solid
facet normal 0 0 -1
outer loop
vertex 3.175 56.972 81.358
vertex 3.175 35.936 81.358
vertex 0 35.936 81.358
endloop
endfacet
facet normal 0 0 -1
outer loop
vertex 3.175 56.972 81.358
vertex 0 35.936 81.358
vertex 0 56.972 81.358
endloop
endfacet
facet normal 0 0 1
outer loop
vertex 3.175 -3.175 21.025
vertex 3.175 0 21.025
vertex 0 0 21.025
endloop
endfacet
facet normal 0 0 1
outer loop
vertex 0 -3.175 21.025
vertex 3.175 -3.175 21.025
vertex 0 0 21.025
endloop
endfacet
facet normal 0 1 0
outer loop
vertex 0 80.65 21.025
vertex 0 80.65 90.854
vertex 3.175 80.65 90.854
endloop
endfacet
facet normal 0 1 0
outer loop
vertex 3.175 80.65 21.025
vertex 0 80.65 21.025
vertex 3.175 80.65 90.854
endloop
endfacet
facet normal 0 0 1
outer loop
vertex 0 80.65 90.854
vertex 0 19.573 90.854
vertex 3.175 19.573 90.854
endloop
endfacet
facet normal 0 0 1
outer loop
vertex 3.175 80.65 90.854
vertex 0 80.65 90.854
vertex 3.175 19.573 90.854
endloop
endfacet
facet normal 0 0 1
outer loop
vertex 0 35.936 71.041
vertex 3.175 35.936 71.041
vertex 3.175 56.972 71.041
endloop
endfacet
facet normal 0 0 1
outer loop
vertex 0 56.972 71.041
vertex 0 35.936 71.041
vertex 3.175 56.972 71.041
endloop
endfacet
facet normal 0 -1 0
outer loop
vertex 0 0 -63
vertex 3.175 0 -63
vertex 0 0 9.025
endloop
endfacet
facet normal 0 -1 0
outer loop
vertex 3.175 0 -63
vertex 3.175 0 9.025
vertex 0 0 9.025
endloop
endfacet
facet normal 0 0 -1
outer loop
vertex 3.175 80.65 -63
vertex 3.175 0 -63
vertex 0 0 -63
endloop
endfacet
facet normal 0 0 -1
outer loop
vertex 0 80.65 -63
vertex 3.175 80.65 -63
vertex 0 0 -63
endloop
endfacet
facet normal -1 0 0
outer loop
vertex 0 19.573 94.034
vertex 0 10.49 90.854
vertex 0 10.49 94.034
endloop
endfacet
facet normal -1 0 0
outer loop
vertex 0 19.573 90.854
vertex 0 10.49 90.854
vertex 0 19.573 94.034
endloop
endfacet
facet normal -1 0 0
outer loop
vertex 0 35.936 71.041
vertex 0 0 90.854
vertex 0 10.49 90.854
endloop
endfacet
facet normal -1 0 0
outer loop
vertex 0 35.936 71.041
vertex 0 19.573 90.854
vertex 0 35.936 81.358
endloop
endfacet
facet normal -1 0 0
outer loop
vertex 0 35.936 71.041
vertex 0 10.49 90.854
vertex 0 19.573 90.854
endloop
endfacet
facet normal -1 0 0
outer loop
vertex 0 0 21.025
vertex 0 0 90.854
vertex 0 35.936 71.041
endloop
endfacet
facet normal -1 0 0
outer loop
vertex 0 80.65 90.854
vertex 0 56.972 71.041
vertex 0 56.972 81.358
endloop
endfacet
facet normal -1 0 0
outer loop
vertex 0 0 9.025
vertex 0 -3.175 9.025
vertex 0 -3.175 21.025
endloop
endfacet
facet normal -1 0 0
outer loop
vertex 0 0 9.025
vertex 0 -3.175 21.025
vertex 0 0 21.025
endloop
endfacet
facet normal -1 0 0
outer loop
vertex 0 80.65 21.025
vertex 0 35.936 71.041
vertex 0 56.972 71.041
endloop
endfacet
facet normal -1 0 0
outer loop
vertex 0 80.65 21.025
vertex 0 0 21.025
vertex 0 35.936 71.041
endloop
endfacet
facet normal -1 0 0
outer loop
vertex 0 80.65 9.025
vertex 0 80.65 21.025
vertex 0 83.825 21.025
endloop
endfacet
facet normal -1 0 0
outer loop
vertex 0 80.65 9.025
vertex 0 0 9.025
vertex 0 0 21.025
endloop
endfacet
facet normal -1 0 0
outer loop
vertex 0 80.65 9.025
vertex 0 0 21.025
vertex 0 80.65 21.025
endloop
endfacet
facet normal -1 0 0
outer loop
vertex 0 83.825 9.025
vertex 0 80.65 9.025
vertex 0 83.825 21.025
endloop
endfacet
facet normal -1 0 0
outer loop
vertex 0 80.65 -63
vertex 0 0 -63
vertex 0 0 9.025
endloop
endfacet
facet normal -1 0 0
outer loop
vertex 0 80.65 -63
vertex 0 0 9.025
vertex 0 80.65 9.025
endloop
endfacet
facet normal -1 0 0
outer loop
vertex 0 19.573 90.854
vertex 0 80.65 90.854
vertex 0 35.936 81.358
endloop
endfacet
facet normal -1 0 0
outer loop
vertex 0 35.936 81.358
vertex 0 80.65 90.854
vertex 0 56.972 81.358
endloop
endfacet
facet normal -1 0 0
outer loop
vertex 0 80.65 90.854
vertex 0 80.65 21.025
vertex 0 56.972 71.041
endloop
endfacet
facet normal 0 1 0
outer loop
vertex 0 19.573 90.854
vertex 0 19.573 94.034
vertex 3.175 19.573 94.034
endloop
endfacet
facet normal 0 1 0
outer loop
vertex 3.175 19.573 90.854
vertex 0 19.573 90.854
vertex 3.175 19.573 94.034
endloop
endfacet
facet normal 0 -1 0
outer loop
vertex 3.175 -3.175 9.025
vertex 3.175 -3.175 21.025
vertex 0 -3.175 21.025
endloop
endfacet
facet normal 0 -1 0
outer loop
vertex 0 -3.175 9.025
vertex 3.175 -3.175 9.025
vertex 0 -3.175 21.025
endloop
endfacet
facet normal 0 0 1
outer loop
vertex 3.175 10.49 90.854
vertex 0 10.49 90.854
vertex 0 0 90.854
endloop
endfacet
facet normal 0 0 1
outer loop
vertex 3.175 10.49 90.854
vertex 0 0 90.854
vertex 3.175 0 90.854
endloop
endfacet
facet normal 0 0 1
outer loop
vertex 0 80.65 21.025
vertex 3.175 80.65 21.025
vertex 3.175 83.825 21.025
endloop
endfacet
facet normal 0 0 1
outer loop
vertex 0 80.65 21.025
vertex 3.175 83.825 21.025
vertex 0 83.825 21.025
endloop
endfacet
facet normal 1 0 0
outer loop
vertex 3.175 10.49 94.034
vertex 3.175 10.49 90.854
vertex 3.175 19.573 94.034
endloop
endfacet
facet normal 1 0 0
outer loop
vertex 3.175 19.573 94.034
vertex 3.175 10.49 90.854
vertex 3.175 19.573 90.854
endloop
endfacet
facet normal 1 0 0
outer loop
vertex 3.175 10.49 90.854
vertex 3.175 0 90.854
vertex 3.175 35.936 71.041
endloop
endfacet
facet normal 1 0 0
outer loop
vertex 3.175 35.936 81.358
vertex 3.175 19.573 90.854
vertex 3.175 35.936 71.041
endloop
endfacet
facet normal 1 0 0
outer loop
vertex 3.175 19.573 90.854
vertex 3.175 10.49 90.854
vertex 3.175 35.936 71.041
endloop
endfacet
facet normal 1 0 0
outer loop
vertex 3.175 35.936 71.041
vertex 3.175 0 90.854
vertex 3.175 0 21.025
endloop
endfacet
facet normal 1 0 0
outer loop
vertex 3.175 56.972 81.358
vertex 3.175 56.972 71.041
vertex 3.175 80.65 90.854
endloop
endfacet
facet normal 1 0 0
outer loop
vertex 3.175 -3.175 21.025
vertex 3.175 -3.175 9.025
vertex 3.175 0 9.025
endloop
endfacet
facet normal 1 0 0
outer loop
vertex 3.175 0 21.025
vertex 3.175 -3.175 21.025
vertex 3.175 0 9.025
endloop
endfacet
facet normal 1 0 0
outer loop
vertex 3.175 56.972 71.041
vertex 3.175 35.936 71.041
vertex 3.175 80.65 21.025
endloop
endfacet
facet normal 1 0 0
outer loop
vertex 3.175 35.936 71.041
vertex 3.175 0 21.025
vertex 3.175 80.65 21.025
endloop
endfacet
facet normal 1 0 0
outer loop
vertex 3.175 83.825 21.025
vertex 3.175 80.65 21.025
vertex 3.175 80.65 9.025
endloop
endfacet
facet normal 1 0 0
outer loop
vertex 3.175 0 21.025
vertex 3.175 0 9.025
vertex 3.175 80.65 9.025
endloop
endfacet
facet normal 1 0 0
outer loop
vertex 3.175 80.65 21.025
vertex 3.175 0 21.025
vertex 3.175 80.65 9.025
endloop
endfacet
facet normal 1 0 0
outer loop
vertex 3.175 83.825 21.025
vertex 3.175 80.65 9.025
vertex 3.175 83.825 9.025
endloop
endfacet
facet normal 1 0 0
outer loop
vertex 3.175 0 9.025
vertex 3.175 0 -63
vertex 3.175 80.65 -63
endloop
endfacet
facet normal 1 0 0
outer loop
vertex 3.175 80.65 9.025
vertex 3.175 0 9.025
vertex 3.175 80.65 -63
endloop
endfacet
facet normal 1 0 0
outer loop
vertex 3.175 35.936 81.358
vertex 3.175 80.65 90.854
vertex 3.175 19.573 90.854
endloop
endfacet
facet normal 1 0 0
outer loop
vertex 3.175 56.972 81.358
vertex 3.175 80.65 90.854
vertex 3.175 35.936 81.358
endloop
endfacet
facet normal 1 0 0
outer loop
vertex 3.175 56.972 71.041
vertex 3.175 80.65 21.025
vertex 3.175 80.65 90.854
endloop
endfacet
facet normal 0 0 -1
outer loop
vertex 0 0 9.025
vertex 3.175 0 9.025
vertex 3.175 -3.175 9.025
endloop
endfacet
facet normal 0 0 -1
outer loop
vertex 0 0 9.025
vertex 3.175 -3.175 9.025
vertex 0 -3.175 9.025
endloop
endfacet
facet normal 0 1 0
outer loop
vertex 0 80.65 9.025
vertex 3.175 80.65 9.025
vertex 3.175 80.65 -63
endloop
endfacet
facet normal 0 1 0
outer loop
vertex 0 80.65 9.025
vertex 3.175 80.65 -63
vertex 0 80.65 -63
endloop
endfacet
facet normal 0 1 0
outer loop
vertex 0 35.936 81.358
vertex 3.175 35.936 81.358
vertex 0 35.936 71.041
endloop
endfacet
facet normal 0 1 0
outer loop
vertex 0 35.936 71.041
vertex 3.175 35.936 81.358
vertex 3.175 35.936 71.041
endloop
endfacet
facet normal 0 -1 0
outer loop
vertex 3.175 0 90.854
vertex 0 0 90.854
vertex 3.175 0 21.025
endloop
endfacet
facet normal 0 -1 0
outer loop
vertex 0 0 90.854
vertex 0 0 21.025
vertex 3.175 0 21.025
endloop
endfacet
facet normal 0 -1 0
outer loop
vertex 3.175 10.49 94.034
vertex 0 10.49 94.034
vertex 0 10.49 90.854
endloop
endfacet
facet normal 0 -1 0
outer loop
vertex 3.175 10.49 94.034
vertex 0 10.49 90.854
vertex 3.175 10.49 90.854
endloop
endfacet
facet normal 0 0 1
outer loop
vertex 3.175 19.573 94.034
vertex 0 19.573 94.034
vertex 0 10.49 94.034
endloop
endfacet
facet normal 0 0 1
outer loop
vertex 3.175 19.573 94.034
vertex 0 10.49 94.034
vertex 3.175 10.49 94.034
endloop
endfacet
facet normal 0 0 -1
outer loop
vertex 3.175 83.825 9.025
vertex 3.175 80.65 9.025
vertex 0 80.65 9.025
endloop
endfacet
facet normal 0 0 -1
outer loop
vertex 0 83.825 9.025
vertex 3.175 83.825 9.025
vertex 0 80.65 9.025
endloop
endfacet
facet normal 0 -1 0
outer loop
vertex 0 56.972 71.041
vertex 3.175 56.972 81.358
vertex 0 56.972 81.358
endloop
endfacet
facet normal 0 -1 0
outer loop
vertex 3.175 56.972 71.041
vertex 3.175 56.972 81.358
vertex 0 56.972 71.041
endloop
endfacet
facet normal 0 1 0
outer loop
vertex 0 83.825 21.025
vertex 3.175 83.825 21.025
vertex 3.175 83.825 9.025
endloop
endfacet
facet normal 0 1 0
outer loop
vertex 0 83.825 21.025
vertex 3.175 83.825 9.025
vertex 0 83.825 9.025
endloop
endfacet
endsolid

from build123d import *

# Parameters (mm, degrees)
SKETCH1_W           = 38.1
SKETCH1_H           = 40.325
BOSS_EXTRUDE1_DEPTH = 3.175
SKETCH3_W           = 3.175
SKETCH3_H           = 10.49
SKETCH3_H_2         = 20.695
CUT_EXTRUDE2_DEPTH  = 4.175
SKETCH5_W           = 3.175
SKETCH5_H           = 12
BOSS_EXTRUDE2_DEPTH = 3.175
SKETCH7_W           = 3.175
SKETCH7_H           = 80.65
BOSS_EXTRUDE3_DEPTH = 63
SKETCH8_W           = 3.175
SKETCH8_H           = 80.65
BOSS_EXTRUDE4_DEPTH = 55.929385
SKETCH9_W           = 3.175
SKETCH9_H           = 9.082720128
BOSS_EXTRUDE5_DEPTH = 3.18
SKETCH10_W          = 10.316938
SKETCH10_H          = 21.036408148
CUT_EXTRUDE3_DEPTH  = 3.18


with BuildPart() as part:
    # Sketch1 → Boss-Extrude1 (new body)
    with BuildSketch(Plane(origin=(0, 0, 0), x_dir=(0, 0, -1), z_dir=(1, 0, 0))):
        with Locations((-19.05, 20.1625)):
            Rectangle(SKETCH1_W, SKETCH1_H)
    boss_extrude1 = extrude(amount=BOSS_EXTRUDE1_DEPTH)

    # Sketch3 → Cut-Extrude2 (cut, through all)
    with BuildSketch(Plane(origin=(3.175, 0, 0), x_dir=(0, 0, -1), z_dir=(1, 0, 0))):
        with Locations((-36.5125, 35.08)):
            Rectangle(SKETCH3_W, SKETCH3_H)
        with Locations((-36.5125, 10.3475)):
            Rectangle(SKETCH3_W, SKETCH3_H_2)
    cut_extrude2 = extrude(amount=-CUT_EXTRUDE2_DEPTH, mode=Mode.SUBTRACT)

    # Sketch5 → Boss-Extrude2 (add)
    with BuildSketch(Plane(origin=(0, 0, 0), x_dir=(-1, 0, 0), z_dir=(0, -1, 0))):
        with Locations((-1.5875, -15.025)):
            Rectangle(SKETCH5_W, SKETCH5_H)
    boss_extrude2 = extrude(amount=BOSS_EXTRUDE2_DEPTH)

    # Mirror1: Boss-Extrude1, Cut-Extrude2, Boss-Extrude2 across plane
    add(boss_extrude1.mirror(Plane(origin=(3.175, 40.325, 0), x_dir=(0, 0, 1), z_dir=(0, -1, 0))))
    add(cut_extrude2.mirror(Plane(origin=(3.175, 40.325, 0), x_dir=(0, 0, 1), z_dir=(0, -1, 0))), mode=Mode.SUBTRACT)
    add(boss_extrude2.mirror(Plane(origin=(3.175, 40.325, 0), x_dir=(0, 0, 1), z_dir=(0, -1, 0))))

    # Sketch7 → Boss-Extrude3 (add)
    with BuildSketch(Plane(origin=(0, 0, 0), x_dir=(-1, 0, 0), z_dir=(0, 0, -1))):
        with Locations((-1.5875, 40.325)):
            Rectangle(SKETCH7_W, SKETCH7_H)
    extrude(amount=BOSS_EXTRUDE3_DEPTH)

    # Sketch8 → Boss-Extrude4 (add)
    with BuildSketch(Plane.XY.offset(34.925)):
        with Locations((1.5875, 40.325)):
            Rectangle(SKETCH8_W, SKETCH8_H)
    extrude(amount=BOSS_EXTRUDE4_DEPTH)

    # Sketch9 → Boss-Extrude5 (add)
    with BuildSketch(Plane.XY.offset(90.85438473)):
        with Locations((1.5875, 15.031360064)):
            Rectangle(SKETCH9_W, SKETCH9_H)
    extrude(amount=BOSS_EXTRUDE5_DEPTH)

    # Sketch10 → Cut-Extrude3 (cut)
    with BuildSketch(Plane(origin=(3.175, 0, 0), x_dir=(0, 0, -1), z_dir=(1, 0, 0))):
        with Locations((-76.199393077, 46.454229061)):
            Rectangle(SKETCH10_W, SKETCH10_H)
    extrude(amount=-CUT_EXTRUDE3_DEPTH, mode=Mode.SUBTRACT)


solid = part.part
